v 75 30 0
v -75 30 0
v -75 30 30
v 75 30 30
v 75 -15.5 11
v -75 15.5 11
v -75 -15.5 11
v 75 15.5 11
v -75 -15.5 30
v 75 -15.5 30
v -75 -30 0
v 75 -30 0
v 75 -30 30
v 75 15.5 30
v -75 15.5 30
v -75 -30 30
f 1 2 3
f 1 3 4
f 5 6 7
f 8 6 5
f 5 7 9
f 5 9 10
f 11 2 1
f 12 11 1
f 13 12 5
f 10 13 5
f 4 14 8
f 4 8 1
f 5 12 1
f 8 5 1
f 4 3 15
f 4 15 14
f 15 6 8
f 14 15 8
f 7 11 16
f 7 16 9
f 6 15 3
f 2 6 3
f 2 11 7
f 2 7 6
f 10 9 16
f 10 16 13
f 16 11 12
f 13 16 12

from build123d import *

# Parameters (mm, degrees)
F0_W     = 150
F0_H     = 14.5
F1_DEPTH = 30
F0_H_2   = 31
F2_DEPTH = 11
F3_DEPTH = 30


with BuildPart() as f1:
    # F0 (on Top) → F1 (new body)
    with BuildSketch(Plane.XY):
        with Locations((0, -22.75)):
            Rectangle(F0_W, F0_H)
    extrude(amount=F1_DEPTH)



with BuildPart() as f1b:
    # F0 (on Top) → F1, piece 2 (new body)
    with BuildSketch(Plane.XY):
        with Locations((0, 22.75)):
            Rectangle(F0_W, F0_H)
    extrude(amount=F1_DEPTH)


with BuildPart() as f1_1:
    add(f1.part)

    add(f1b.part)  # F2 merges F1b
    # F0 (on Top) → F2 (join)
    with BuildSketch(Plane.XY):
        Rectangle(F0_W, F0_H_2)
    extrude(amount=F2_DEPTH)

    # F0 (on Top) → F3 (join)
    with BuildSketch(Plane.XY):
        with Locations((0, 22.75)):
            Rectangle(F0_W, F0_H)
    extrude(amount=F3_DEPTH)


solid = f1_1.part
